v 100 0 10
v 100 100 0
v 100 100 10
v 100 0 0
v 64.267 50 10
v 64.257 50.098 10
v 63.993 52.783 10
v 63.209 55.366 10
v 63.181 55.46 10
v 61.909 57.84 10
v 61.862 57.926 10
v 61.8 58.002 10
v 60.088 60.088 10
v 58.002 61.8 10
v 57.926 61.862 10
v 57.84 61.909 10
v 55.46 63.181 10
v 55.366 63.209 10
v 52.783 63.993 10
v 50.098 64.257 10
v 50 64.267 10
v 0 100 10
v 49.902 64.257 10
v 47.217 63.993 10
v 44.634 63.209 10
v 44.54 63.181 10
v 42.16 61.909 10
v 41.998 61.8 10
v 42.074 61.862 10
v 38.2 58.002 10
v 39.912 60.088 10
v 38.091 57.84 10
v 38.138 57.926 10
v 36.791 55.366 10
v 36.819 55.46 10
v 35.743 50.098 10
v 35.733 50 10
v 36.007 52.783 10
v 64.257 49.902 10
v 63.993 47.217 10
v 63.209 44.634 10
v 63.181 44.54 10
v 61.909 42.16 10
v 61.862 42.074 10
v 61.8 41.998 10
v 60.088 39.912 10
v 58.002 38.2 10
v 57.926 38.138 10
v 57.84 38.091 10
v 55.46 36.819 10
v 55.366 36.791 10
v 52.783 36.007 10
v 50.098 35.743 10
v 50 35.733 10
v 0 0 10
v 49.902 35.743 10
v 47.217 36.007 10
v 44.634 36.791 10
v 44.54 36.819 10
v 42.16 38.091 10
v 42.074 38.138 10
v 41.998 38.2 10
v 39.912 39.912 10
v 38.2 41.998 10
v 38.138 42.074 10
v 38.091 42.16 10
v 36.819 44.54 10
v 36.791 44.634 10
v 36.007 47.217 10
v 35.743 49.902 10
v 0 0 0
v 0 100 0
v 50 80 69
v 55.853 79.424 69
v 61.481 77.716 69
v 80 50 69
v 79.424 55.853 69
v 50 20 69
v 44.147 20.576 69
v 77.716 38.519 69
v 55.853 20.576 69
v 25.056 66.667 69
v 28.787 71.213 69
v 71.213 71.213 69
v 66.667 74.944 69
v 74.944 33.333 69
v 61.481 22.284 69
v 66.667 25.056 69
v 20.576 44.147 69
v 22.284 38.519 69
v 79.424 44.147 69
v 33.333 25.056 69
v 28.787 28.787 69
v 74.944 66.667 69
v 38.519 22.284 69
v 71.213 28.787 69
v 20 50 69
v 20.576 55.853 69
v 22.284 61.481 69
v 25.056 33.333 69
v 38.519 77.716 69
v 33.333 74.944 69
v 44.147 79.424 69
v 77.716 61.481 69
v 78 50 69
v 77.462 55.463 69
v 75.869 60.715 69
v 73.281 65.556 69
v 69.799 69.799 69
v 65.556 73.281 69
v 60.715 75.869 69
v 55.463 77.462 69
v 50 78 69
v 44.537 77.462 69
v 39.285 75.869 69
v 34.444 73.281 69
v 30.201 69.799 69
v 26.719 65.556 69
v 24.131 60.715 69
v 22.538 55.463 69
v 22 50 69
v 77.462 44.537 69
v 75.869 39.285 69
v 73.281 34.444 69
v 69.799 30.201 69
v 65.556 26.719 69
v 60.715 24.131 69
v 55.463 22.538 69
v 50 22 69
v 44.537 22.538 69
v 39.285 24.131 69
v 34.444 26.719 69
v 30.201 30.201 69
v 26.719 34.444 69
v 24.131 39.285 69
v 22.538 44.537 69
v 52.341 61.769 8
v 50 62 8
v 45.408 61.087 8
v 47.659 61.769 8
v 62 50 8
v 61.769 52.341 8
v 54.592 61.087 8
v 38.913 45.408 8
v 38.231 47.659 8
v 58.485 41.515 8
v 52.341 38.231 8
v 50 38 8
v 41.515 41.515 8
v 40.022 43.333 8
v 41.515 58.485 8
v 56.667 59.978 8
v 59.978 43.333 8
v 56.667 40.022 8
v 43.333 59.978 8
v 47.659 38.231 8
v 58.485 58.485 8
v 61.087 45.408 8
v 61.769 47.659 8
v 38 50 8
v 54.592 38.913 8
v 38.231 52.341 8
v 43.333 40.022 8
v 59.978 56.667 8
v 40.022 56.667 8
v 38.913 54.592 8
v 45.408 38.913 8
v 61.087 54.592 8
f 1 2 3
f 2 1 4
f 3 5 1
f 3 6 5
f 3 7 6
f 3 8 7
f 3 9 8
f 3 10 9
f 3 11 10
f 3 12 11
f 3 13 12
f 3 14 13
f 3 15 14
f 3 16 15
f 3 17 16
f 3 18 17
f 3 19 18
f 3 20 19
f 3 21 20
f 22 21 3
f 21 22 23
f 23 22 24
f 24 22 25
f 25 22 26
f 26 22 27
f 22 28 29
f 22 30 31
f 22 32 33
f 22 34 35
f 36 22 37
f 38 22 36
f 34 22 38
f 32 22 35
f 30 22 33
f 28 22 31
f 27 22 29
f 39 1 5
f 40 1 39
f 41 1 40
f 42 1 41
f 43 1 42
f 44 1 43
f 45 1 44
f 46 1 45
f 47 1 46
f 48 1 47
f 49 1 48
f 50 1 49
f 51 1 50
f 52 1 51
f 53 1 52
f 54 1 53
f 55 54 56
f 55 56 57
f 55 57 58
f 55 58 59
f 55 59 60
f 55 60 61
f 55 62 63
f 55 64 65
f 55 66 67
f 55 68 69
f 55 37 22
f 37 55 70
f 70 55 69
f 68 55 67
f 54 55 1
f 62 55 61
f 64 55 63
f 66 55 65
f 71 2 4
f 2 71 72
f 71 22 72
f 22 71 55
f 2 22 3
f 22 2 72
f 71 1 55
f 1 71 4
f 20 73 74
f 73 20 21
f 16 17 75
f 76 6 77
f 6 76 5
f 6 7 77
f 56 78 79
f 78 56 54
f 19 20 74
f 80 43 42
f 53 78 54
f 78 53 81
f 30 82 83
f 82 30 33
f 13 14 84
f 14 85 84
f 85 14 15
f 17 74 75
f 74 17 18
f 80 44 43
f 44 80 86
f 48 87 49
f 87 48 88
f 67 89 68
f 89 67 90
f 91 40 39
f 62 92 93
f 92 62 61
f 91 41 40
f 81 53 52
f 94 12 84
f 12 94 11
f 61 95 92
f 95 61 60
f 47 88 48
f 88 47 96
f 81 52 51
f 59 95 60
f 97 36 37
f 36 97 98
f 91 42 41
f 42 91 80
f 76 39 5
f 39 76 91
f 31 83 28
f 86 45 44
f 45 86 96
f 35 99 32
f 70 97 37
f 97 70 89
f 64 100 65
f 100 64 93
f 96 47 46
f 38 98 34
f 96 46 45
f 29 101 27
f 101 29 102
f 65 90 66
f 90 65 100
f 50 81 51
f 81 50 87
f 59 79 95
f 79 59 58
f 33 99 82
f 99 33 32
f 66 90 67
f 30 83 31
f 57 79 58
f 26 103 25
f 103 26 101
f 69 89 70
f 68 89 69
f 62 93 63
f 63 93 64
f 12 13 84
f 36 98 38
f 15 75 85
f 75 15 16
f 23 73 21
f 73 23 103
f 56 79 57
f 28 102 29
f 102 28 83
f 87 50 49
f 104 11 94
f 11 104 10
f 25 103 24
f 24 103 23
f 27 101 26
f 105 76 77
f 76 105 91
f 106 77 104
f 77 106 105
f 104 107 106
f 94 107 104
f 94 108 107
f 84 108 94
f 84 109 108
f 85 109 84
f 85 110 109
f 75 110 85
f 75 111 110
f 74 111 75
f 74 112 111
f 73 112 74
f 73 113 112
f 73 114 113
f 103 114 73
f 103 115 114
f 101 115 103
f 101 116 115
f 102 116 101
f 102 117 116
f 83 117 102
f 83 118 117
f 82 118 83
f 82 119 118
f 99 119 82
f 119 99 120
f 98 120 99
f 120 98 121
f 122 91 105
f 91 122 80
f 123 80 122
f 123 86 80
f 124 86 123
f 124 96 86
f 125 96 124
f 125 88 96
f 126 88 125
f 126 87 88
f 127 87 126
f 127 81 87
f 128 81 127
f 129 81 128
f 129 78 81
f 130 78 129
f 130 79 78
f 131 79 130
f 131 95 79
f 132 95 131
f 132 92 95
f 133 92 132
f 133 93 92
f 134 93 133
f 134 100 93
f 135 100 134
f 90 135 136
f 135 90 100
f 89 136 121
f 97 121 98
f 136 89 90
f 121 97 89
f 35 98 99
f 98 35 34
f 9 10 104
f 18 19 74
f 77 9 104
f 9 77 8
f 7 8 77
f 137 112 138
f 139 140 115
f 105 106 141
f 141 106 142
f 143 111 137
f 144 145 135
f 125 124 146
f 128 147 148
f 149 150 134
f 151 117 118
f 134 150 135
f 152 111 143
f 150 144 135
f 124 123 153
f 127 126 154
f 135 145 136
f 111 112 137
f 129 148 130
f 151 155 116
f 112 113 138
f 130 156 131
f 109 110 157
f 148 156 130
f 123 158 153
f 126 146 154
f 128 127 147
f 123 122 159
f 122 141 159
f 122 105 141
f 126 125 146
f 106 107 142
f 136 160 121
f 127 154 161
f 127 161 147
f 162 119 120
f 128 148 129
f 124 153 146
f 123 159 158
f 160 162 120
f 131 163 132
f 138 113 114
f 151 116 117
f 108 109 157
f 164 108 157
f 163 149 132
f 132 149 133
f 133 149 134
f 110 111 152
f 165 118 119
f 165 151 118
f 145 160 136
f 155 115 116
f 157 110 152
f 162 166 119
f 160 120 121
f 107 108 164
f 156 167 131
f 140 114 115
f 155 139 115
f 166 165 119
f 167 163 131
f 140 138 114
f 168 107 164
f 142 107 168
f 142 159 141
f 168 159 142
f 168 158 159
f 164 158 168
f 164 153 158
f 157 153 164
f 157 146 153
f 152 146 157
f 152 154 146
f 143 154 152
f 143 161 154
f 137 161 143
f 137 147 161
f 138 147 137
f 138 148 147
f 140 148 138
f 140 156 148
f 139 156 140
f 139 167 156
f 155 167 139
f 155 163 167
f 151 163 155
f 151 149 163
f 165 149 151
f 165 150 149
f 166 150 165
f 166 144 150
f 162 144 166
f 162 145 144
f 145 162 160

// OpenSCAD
$fn = 32;

// ----------------------------------------------------------------------
// Hopper: funnel with square flange
// ----------------------------------------------------------------------

// --- parameters (mm) ---
fl = 100;                 // flange side, X and Y
fl_t = 10;                // flange thickness
cone_h = 60;              // cone height above the flange
top_d = 60;               // cone mouth diameter
bot_d = 28;               // cone spout diameter
wall = 2;                 // cone wall thickness

bore_d = bot_d - 2 * wall;  // spout bore diameter
total_h = fl_t + cone_h - 1;  // overall height

difference() {
  union() {
    cube([fl, fl, fl_t]);
    translate([fl / 2, fl / 2, fl_t - 1])
      cylinder(h = cone_h, d1 = bot_d, d2 = top_d);
  }
  translate([fl / 2, fl / 2, fl_t - 2])
    cylinder(h = cone_h + 1, d1 = bore_d, d2 = top_d - 2 * wall);
}
